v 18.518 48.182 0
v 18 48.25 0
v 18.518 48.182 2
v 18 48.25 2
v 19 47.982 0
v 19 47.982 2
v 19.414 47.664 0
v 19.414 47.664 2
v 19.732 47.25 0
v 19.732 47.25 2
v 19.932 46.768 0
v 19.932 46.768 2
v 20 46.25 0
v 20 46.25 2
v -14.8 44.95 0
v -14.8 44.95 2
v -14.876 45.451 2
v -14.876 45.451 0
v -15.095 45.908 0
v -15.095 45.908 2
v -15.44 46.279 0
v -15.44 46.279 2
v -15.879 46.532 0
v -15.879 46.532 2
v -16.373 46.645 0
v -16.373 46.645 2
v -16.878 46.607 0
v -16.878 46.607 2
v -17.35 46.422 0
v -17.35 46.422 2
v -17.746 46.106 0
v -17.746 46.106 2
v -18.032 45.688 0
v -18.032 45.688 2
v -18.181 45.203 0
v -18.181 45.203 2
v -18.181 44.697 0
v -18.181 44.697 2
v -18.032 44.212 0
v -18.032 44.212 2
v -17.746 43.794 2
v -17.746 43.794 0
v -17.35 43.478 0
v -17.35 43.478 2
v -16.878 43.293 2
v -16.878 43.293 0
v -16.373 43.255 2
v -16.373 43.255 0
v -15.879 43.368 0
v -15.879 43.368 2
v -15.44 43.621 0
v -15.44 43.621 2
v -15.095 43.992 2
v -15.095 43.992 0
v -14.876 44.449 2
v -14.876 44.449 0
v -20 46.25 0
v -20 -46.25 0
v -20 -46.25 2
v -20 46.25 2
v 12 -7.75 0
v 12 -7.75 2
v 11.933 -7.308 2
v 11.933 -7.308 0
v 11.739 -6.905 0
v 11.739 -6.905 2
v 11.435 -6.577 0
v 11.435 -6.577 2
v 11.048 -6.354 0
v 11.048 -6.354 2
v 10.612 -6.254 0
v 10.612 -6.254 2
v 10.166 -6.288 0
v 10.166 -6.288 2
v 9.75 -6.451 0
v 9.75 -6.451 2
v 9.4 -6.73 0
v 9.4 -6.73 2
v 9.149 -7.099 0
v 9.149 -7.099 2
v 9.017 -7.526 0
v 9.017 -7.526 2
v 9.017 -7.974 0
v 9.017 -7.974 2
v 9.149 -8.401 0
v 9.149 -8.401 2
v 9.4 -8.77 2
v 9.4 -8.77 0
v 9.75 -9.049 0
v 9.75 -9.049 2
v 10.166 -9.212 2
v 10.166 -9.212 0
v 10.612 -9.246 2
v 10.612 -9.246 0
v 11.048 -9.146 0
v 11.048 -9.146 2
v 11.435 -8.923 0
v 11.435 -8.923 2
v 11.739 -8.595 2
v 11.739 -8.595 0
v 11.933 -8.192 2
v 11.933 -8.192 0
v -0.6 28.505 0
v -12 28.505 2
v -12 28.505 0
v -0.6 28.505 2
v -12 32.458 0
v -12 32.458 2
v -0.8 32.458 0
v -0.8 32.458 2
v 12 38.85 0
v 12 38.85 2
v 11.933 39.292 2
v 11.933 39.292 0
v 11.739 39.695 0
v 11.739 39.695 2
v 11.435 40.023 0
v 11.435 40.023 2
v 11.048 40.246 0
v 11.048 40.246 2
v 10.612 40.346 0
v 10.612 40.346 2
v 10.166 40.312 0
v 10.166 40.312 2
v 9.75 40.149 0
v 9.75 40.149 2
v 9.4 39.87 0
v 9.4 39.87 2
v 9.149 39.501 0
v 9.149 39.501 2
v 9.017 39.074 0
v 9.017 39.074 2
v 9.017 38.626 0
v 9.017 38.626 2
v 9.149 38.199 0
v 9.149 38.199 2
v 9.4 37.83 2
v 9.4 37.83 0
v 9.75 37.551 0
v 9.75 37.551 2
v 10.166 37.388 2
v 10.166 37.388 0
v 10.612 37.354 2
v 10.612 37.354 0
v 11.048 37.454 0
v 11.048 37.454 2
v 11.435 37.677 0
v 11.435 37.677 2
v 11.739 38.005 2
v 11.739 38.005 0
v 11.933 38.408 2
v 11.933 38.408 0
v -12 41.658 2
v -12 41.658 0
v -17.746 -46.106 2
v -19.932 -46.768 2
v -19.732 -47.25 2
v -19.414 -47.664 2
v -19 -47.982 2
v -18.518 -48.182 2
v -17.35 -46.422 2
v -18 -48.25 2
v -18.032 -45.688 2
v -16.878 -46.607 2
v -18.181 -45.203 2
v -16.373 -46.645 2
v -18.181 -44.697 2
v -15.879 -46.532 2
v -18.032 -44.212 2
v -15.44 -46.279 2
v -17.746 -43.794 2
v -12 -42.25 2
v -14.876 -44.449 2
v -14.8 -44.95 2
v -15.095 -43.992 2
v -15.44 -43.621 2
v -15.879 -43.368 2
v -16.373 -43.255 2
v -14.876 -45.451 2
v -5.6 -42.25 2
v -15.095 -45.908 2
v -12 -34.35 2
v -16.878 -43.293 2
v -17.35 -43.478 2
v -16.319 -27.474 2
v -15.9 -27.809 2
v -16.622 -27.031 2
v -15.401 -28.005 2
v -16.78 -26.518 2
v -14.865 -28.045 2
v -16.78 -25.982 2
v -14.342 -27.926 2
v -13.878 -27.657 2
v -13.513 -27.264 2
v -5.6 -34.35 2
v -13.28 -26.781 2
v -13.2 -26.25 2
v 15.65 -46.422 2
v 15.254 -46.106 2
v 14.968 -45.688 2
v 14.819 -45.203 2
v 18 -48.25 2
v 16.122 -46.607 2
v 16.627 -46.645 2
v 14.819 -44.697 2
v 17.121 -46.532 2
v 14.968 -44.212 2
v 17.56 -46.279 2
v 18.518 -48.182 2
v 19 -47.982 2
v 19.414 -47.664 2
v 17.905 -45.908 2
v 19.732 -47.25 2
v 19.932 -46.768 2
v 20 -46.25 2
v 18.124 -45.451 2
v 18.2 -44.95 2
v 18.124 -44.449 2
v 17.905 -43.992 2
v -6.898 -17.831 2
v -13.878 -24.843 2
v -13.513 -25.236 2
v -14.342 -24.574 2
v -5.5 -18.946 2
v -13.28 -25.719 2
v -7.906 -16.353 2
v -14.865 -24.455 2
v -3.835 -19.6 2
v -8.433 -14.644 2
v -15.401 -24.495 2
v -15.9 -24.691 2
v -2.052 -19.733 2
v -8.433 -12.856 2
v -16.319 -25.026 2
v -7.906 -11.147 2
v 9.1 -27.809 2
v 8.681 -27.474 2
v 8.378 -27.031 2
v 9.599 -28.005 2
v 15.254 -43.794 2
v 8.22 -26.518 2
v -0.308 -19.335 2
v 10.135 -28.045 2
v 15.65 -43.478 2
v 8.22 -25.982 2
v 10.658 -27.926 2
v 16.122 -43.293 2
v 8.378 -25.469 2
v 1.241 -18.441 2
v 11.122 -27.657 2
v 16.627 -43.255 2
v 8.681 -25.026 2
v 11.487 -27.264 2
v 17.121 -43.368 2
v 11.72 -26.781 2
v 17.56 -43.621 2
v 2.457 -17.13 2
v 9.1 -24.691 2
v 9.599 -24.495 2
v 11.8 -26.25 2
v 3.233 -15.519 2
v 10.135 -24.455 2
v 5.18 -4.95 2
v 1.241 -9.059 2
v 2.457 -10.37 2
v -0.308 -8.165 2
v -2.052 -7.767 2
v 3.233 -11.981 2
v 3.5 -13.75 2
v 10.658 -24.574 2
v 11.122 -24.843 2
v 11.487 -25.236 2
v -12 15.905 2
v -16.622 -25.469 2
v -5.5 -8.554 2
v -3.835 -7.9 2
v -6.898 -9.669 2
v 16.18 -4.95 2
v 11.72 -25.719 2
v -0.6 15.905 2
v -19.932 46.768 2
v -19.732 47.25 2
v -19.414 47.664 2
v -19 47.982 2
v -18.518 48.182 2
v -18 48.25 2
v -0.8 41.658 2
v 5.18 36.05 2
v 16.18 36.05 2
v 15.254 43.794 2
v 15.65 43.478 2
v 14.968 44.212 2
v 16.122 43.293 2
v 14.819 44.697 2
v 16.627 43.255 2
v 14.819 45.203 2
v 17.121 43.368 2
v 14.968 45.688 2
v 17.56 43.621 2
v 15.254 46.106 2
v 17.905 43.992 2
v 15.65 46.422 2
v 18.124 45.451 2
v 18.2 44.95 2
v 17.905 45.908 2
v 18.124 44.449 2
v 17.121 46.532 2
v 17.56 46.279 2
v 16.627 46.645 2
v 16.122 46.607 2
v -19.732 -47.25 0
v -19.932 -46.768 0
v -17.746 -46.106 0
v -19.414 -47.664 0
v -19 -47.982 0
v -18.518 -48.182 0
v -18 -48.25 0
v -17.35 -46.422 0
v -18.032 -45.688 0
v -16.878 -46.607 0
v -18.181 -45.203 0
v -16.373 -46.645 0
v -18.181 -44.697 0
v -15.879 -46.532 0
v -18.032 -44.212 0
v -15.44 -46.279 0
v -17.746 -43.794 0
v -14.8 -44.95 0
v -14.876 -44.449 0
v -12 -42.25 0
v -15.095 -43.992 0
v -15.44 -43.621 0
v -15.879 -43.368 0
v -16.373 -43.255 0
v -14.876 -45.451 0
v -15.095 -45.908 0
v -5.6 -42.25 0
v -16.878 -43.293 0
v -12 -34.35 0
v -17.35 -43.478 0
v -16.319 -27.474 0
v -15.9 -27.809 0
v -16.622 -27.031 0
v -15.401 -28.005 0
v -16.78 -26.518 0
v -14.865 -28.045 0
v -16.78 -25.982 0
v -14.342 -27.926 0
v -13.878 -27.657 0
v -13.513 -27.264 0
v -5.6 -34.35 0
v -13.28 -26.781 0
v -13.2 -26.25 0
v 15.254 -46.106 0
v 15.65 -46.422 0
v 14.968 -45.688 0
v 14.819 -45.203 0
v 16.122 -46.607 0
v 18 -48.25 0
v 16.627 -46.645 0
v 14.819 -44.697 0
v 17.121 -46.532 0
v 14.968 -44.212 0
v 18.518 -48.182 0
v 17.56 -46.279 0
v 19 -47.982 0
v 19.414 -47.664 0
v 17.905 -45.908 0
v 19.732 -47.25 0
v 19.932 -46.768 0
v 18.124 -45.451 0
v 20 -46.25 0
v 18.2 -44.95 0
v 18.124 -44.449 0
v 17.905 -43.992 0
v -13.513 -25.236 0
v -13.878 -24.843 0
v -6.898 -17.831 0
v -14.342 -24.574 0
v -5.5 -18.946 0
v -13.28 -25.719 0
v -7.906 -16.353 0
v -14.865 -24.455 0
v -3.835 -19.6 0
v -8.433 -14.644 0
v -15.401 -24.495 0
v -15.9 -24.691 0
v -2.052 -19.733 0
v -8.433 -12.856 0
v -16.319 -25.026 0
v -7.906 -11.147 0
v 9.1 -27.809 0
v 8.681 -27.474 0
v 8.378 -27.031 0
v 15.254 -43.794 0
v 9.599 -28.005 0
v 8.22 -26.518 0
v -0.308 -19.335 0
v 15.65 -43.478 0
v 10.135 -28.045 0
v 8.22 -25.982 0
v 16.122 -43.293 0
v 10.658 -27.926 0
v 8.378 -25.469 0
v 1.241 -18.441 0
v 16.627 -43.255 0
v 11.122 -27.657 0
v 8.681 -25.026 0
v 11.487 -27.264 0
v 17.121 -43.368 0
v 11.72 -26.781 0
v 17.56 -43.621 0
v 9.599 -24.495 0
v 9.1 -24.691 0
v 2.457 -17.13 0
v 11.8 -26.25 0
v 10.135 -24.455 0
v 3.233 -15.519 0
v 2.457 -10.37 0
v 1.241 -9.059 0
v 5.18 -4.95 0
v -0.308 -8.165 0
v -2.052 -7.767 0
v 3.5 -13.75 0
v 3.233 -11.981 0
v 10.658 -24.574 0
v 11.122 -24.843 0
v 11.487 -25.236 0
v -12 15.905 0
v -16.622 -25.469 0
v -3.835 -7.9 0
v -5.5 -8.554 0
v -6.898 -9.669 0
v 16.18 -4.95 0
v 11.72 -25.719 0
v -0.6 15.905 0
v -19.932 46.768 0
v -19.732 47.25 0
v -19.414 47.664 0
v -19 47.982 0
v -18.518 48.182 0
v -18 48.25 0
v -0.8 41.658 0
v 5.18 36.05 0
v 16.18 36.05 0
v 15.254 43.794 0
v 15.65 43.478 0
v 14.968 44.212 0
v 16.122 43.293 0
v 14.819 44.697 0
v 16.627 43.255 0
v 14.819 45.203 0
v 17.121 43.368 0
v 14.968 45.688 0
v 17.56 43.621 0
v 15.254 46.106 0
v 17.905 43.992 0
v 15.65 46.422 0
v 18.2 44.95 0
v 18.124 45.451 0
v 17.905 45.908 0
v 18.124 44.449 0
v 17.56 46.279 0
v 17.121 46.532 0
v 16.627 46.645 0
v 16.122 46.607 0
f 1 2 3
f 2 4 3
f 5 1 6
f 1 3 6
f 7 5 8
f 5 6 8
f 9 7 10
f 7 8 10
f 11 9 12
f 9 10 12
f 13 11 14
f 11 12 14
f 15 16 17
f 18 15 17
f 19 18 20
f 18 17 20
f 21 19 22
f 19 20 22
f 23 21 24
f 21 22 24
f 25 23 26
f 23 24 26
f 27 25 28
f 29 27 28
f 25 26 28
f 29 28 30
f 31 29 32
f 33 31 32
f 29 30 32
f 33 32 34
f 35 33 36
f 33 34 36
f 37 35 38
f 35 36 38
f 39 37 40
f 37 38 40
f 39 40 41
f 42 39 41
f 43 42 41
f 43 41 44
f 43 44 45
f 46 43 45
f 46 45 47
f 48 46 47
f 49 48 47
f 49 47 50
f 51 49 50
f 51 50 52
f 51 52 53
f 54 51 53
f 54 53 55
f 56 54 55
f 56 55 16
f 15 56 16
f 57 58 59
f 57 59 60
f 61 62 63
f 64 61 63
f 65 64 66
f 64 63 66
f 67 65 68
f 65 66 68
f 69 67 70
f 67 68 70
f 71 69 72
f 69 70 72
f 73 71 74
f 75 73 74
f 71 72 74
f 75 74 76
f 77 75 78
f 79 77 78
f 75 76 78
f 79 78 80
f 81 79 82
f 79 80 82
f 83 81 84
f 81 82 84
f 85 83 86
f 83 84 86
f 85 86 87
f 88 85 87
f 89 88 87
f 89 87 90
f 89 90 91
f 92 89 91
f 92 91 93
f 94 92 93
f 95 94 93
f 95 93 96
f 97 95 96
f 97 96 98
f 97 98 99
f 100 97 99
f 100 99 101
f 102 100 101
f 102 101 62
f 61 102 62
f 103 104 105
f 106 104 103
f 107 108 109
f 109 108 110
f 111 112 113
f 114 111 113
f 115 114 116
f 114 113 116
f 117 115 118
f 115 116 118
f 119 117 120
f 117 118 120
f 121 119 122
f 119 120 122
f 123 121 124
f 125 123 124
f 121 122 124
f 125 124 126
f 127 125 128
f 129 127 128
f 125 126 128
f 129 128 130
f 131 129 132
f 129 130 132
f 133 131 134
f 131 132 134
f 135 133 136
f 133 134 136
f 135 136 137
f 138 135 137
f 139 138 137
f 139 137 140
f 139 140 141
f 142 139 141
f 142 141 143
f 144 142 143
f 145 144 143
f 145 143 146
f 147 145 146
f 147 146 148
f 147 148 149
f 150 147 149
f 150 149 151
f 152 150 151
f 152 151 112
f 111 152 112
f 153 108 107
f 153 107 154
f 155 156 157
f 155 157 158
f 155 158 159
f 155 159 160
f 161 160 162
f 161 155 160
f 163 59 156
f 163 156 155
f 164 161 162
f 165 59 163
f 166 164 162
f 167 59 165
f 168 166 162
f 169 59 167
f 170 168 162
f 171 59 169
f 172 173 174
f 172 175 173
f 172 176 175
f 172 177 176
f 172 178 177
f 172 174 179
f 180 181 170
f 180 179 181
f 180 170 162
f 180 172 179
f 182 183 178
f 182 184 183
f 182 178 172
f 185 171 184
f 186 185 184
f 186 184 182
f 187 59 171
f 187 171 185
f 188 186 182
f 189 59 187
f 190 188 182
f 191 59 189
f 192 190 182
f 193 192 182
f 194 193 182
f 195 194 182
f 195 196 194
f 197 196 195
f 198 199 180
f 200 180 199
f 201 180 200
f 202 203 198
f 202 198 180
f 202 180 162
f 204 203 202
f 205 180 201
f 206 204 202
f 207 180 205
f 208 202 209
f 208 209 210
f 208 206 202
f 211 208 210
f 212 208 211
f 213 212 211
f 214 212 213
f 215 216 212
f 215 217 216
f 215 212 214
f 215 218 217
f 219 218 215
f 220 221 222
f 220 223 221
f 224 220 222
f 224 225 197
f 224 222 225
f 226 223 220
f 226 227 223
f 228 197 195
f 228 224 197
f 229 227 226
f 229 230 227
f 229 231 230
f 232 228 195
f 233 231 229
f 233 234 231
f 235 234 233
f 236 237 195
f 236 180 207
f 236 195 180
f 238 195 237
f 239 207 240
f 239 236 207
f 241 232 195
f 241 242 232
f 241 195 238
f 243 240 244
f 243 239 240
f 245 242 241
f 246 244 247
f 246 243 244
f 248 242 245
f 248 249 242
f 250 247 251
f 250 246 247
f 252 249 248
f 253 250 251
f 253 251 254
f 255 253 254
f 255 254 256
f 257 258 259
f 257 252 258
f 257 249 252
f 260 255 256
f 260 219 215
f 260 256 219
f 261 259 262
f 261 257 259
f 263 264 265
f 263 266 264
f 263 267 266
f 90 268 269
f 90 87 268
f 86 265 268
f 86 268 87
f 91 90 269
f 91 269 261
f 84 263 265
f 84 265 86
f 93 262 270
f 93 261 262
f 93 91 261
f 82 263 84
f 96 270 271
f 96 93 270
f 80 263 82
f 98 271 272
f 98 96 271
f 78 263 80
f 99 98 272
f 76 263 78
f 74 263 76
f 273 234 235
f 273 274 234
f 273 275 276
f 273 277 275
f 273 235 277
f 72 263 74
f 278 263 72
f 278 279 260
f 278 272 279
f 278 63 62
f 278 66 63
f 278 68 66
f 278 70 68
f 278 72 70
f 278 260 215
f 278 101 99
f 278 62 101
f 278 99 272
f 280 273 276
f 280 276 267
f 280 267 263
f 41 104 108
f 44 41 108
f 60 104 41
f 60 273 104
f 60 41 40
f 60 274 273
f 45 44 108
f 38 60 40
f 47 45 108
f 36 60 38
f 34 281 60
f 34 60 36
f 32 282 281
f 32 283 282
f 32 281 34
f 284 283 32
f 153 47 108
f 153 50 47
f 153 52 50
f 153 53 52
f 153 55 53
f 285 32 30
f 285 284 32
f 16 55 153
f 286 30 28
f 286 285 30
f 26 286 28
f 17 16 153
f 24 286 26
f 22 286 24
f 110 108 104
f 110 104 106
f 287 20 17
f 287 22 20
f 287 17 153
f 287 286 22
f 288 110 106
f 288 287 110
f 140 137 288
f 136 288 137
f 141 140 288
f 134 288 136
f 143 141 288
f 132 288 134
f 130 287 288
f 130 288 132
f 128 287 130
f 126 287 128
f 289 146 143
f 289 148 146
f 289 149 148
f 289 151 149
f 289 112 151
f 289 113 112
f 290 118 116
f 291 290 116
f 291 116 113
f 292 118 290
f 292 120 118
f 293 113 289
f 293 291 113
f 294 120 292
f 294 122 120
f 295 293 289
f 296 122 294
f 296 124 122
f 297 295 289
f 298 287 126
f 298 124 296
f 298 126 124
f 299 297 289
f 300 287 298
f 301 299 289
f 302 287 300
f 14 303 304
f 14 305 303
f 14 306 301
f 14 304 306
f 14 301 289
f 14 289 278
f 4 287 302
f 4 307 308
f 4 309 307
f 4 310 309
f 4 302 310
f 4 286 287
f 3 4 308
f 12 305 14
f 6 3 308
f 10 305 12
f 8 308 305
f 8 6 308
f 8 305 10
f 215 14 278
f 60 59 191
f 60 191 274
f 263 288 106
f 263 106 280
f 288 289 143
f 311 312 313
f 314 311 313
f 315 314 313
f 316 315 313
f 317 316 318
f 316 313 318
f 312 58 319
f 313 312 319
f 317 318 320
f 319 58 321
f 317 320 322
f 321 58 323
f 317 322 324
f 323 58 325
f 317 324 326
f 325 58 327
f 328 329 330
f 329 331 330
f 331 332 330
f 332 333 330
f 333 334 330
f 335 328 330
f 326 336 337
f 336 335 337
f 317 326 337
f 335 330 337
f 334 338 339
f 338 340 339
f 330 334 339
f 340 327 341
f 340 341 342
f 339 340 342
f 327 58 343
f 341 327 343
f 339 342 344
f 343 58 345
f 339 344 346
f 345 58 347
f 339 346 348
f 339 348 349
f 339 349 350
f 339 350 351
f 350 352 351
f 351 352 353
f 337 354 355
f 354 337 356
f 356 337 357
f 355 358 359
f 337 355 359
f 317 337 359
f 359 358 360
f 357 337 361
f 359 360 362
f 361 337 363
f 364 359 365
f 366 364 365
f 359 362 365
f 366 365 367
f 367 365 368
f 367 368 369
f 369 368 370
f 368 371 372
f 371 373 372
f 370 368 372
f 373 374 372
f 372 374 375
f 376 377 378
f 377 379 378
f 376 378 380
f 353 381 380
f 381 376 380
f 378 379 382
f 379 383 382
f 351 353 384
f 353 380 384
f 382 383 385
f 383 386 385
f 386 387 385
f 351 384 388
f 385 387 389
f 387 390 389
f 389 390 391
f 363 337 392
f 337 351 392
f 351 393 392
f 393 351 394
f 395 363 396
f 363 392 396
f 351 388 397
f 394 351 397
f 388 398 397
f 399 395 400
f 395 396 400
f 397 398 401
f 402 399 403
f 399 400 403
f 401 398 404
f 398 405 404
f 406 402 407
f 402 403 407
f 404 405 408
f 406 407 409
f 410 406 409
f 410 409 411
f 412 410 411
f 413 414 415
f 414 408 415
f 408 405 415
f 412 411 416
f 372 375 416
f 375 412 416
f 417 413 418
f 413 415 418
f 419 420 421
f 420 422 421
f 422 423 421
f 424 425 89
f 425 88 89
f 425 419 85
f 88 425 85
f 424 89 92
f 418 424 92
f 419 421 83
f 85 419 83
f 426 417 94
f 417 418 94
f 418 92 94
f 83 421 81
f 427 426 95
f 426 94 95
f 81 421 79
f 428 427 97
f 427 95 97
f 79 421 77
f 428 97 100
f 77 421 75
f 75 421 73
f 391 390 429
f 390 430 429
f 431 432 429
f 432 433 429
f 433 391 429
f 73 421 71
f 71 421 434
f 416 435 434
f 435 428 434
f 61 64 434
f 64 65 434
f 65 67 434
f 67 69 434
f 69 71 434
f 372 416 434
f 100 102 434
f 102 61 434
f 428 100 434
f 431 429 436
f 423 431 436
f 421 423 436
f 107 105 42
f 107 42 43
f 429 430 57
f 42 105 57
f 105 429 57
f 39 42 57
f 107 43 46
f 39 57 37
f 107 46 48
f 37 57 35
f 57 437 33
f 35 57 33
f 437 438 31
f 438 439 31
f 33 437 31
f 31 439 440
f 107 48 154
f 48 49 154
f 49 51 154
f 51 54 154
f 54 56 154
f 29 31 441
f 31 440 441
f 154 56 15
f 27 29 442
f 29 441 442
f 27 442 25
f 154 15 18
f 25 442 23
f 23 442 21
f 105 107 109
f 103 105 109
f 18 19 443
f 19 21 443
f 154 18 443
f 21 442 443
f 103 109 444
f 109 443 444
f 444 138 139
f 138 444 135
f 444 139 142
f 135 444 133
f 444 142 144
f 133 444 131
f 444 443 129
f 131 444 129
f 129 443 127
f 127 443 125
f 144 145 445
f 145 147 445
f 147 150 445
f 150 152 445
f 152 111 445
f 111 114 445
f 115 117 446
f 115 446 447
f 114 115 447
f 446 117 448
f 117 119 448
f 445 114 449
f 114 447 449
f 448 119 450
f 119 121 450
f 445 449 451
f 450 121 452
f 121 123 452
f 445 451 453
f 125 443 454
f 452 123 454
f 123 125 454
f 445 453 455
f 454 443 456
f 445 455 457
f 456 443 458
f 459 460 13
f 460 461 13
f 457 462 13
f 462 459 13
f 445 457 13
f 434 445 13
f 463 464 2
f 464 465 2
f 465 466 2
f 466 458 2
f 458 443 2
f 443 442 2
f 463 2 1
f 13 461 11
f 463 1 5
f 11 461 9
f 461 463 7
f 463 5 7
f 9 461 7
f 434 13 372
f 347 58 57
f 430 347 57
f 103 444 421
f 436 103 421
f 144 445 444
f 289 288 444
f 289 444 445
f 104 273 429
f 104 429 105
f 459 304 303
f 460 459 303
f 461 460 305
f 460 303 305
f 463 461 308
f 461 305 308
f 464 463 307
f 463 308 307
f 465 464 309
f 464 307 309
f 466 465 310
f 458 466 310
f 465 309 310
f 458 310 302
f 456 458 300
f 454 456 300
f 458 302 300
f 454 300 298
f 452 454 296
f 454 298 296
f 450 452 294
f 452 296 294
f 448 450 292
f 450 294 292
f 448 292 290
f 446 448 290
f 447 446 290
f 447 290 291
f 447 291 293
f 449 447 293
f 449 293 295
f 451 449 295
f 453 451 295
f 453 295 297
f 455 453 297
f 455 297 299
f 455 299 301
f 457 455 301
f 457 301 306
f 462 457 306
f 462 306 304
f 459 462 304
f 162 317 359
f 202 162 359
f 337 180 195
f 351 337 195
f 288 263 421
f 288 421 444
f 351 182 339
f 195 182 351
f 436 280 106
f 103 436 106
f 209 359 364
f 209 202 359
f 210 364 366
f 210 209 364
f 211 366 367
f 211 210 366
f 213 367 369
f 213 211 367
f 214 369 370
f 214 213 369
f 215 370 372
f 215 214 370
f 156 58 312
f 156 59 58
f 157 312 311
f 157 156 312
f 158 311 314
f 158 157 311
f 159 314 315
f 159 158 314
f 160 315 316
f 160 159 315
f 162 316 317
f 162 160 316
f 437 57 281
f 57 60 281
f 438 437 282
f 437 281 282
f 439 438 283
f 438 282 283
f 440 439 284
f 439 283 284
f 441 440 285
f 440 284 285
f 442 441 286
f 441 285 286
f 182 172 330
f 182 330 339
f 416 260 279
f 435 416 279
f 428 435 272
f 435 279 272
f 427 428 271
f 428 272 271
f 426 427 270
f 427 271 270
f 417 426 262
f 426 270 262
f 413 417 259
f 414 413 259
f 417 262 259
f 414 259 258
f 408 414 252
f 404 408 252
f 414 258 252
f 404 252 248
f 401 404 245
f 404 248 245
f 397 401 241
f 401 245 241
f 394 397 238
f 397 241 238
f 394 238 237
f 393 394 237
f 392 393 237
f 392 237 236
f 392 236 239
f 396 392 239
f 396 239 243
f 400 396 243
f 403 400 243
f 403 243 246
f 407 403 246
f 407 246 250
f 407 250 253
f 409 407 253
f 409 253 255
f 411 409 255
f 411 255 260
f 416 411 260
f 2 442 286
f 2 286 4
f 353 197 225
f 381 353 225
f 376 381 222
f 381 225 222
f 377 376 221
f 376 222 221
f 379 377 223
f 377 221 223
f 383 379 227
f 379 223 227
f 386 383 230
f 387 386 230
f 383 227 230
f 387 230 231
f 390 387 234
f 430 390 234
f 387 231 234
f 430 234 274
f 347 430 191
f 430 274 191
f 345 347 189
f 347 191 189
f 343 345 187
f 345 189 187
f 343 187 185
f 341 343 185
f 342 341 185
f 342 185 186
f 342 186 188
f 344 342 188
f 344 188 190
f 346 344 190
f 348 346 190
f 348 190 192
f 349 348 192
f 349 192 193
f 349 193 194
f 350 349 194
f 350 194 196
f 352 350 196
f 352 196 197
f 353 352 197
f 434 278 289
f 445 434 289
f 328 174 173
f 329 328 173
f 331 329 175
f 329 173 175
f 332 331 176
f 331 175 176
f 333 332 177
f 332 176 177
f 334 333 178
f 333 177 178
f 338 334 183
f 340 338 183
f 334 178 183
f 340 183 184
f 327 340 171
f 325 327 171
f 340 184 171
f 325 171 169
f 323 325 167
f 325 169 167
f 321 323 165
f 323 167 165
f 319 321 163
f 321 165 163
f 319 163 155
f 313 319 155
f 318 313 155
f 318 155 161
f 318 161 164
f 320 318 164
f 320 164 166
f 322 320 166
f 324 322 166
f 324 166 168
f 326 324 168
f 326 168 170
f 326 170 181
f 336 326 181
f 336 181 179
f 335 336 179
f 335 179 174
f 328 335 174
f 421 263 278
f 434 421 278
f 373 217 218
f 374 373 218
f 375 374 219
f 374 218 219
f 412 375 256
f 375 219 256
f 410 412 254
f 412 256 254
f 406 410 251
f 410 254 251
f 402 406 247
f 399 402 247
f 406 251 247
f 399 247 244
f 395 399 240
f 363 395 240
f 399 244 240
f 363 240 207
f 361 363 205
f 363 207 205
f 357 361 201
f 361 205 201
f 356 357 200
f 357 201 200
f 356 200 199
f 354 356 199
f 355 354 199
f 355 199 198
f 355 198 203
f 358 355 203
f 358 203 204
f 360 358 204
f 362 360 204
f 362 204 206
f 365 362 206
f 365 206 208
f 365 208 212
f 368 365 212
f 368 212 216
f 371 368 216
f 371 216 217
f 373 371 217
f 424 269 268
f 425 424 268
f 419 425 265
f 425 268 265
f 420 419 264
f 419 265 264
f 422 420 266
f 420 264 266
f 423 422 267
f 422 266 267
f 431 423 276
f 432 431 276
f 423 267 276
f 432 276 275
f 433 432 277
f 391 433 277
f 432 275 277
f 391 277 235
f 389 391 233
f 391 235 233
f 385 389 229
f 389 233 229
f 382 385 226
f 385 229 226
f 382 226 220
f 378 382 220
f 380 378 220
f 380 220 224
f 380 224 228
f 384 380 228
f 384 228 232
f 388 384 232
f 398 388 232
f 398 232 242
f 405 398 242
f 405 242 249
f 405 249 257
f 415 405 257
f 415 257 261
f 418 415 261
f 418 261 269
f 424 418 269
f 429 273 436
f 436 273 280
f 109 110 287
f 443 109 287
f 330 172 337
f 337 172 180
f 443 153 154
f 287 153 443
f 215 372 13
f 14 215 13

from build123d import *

# Parameters (mm, degrees)
SKETCH_W      = 40
SKETCH_H      = 96.5
PAD_DEPTH     = 2
SKETCH001_R   = 1.7
SKETCH001_R_2 = 1.5
SKETCH001_R_3 = 6
SKETCH001_R_4 = 1.8
SKETCH001_W   = 11
SKETCH001_H   = 41
SKETCH001_W_2 = 11.2
SKETCH001_H_2 = 9.2
SKETCH001_W_3 = 11.4
SKETCH001_H_3 = 12.6
SKETCH001_W_4 = 6.4
SKETCH001_H_4 = 7.9
POCKET_DEPTH  = 5
FILLET_R      = 2
FILLET001_R   = 2
FILLET002_R   = 2
FILLET003_R   = 2


with BuildPart() as part:
    # Sketch → Pad (new body)
    with BuildSketch(Plane.XY):
        Rectangle(SKETCH_W, SKETCH_H)
    extrude(amount=PAD_DEPTH)

    # Sketch001 (on Face6 of Pad) → Pocket (cut)
    with BuildSketch(Plane.XY.offset(2)):
        with Locations((-16.5, 44.95)):
            Circle(SKETCH001_R)
        with Locations((16.5, 44.95)):
            Circle(SKETCH001_R)
        with Locations((-16.5, -44.95)):
            Circle(SKETCH001_R)
        with Locations((16.5, -44.95)):
            Circle(SKETCH001_R)
        with Locations((10.5, 38.85)):
            Circle(SKETCH001_R_2)
        with Locations((10.5, -7.75)):
            Circle(SKETCH001_R_2)
        with Locations((-2.5, -13.75)):
            Circle(SKETCH001_R_3)
        with Locations((-15, -26.25)):
            Circle(SKETCH001_R_4)
        with Locations((10, -26.25)):
            Circle(SKETCH001_R_4)
        with Locations((10.68, 15.55)):
            Rectangle(SKETCH001_W, SKETCH001_H)
        with Locations((-6.4, 37.05754)):
            Rectangle(SKETCH001_W_2, SKETCH001_H_2)
        with Locations((-6.3, 22.205288)):
            Rectangle(SKETCH001_W_3, SKETCH001_H_3)
        with Locations((-8.8, -38.3)):
            Rectangle(SKETCH001_W_4, SKETCH001_H_4)
    extrude(amount=-POCKET_DEPTH, mode=Mode.SUBTRACT)

    # Fillet
    fillet_edges = [part.edges().sort_by_distance(p)[0] for p in [
        (-20, 48.25, 1),
    ]]
    fillet(fillet_edges, radius=FILLET_R)

    # Fillet001
    fillet001_edges = [part.edges().sort_by_distance(p)[0] for p in [
        (20, 48.25, 1),
    ]]
    fillet(fillet001_edges, radius=FILLET001_R)

    # Fillet002
    fillet002_edges = [part.edges().sort_by_distance(p)[0] for p in [
        (-20, -48.25, 1),
    ]]
    fillet(fillet002_edges, radius=FILLET002_R)

    # Fillet003
    fillet003_edges = [part.edges().sort_by_distance(p)[0] for p in [
        (20, -48.25, 1),
    ]]
    fillet(fillet003_edges, radius=FILLET003_R)


solid = part.part
